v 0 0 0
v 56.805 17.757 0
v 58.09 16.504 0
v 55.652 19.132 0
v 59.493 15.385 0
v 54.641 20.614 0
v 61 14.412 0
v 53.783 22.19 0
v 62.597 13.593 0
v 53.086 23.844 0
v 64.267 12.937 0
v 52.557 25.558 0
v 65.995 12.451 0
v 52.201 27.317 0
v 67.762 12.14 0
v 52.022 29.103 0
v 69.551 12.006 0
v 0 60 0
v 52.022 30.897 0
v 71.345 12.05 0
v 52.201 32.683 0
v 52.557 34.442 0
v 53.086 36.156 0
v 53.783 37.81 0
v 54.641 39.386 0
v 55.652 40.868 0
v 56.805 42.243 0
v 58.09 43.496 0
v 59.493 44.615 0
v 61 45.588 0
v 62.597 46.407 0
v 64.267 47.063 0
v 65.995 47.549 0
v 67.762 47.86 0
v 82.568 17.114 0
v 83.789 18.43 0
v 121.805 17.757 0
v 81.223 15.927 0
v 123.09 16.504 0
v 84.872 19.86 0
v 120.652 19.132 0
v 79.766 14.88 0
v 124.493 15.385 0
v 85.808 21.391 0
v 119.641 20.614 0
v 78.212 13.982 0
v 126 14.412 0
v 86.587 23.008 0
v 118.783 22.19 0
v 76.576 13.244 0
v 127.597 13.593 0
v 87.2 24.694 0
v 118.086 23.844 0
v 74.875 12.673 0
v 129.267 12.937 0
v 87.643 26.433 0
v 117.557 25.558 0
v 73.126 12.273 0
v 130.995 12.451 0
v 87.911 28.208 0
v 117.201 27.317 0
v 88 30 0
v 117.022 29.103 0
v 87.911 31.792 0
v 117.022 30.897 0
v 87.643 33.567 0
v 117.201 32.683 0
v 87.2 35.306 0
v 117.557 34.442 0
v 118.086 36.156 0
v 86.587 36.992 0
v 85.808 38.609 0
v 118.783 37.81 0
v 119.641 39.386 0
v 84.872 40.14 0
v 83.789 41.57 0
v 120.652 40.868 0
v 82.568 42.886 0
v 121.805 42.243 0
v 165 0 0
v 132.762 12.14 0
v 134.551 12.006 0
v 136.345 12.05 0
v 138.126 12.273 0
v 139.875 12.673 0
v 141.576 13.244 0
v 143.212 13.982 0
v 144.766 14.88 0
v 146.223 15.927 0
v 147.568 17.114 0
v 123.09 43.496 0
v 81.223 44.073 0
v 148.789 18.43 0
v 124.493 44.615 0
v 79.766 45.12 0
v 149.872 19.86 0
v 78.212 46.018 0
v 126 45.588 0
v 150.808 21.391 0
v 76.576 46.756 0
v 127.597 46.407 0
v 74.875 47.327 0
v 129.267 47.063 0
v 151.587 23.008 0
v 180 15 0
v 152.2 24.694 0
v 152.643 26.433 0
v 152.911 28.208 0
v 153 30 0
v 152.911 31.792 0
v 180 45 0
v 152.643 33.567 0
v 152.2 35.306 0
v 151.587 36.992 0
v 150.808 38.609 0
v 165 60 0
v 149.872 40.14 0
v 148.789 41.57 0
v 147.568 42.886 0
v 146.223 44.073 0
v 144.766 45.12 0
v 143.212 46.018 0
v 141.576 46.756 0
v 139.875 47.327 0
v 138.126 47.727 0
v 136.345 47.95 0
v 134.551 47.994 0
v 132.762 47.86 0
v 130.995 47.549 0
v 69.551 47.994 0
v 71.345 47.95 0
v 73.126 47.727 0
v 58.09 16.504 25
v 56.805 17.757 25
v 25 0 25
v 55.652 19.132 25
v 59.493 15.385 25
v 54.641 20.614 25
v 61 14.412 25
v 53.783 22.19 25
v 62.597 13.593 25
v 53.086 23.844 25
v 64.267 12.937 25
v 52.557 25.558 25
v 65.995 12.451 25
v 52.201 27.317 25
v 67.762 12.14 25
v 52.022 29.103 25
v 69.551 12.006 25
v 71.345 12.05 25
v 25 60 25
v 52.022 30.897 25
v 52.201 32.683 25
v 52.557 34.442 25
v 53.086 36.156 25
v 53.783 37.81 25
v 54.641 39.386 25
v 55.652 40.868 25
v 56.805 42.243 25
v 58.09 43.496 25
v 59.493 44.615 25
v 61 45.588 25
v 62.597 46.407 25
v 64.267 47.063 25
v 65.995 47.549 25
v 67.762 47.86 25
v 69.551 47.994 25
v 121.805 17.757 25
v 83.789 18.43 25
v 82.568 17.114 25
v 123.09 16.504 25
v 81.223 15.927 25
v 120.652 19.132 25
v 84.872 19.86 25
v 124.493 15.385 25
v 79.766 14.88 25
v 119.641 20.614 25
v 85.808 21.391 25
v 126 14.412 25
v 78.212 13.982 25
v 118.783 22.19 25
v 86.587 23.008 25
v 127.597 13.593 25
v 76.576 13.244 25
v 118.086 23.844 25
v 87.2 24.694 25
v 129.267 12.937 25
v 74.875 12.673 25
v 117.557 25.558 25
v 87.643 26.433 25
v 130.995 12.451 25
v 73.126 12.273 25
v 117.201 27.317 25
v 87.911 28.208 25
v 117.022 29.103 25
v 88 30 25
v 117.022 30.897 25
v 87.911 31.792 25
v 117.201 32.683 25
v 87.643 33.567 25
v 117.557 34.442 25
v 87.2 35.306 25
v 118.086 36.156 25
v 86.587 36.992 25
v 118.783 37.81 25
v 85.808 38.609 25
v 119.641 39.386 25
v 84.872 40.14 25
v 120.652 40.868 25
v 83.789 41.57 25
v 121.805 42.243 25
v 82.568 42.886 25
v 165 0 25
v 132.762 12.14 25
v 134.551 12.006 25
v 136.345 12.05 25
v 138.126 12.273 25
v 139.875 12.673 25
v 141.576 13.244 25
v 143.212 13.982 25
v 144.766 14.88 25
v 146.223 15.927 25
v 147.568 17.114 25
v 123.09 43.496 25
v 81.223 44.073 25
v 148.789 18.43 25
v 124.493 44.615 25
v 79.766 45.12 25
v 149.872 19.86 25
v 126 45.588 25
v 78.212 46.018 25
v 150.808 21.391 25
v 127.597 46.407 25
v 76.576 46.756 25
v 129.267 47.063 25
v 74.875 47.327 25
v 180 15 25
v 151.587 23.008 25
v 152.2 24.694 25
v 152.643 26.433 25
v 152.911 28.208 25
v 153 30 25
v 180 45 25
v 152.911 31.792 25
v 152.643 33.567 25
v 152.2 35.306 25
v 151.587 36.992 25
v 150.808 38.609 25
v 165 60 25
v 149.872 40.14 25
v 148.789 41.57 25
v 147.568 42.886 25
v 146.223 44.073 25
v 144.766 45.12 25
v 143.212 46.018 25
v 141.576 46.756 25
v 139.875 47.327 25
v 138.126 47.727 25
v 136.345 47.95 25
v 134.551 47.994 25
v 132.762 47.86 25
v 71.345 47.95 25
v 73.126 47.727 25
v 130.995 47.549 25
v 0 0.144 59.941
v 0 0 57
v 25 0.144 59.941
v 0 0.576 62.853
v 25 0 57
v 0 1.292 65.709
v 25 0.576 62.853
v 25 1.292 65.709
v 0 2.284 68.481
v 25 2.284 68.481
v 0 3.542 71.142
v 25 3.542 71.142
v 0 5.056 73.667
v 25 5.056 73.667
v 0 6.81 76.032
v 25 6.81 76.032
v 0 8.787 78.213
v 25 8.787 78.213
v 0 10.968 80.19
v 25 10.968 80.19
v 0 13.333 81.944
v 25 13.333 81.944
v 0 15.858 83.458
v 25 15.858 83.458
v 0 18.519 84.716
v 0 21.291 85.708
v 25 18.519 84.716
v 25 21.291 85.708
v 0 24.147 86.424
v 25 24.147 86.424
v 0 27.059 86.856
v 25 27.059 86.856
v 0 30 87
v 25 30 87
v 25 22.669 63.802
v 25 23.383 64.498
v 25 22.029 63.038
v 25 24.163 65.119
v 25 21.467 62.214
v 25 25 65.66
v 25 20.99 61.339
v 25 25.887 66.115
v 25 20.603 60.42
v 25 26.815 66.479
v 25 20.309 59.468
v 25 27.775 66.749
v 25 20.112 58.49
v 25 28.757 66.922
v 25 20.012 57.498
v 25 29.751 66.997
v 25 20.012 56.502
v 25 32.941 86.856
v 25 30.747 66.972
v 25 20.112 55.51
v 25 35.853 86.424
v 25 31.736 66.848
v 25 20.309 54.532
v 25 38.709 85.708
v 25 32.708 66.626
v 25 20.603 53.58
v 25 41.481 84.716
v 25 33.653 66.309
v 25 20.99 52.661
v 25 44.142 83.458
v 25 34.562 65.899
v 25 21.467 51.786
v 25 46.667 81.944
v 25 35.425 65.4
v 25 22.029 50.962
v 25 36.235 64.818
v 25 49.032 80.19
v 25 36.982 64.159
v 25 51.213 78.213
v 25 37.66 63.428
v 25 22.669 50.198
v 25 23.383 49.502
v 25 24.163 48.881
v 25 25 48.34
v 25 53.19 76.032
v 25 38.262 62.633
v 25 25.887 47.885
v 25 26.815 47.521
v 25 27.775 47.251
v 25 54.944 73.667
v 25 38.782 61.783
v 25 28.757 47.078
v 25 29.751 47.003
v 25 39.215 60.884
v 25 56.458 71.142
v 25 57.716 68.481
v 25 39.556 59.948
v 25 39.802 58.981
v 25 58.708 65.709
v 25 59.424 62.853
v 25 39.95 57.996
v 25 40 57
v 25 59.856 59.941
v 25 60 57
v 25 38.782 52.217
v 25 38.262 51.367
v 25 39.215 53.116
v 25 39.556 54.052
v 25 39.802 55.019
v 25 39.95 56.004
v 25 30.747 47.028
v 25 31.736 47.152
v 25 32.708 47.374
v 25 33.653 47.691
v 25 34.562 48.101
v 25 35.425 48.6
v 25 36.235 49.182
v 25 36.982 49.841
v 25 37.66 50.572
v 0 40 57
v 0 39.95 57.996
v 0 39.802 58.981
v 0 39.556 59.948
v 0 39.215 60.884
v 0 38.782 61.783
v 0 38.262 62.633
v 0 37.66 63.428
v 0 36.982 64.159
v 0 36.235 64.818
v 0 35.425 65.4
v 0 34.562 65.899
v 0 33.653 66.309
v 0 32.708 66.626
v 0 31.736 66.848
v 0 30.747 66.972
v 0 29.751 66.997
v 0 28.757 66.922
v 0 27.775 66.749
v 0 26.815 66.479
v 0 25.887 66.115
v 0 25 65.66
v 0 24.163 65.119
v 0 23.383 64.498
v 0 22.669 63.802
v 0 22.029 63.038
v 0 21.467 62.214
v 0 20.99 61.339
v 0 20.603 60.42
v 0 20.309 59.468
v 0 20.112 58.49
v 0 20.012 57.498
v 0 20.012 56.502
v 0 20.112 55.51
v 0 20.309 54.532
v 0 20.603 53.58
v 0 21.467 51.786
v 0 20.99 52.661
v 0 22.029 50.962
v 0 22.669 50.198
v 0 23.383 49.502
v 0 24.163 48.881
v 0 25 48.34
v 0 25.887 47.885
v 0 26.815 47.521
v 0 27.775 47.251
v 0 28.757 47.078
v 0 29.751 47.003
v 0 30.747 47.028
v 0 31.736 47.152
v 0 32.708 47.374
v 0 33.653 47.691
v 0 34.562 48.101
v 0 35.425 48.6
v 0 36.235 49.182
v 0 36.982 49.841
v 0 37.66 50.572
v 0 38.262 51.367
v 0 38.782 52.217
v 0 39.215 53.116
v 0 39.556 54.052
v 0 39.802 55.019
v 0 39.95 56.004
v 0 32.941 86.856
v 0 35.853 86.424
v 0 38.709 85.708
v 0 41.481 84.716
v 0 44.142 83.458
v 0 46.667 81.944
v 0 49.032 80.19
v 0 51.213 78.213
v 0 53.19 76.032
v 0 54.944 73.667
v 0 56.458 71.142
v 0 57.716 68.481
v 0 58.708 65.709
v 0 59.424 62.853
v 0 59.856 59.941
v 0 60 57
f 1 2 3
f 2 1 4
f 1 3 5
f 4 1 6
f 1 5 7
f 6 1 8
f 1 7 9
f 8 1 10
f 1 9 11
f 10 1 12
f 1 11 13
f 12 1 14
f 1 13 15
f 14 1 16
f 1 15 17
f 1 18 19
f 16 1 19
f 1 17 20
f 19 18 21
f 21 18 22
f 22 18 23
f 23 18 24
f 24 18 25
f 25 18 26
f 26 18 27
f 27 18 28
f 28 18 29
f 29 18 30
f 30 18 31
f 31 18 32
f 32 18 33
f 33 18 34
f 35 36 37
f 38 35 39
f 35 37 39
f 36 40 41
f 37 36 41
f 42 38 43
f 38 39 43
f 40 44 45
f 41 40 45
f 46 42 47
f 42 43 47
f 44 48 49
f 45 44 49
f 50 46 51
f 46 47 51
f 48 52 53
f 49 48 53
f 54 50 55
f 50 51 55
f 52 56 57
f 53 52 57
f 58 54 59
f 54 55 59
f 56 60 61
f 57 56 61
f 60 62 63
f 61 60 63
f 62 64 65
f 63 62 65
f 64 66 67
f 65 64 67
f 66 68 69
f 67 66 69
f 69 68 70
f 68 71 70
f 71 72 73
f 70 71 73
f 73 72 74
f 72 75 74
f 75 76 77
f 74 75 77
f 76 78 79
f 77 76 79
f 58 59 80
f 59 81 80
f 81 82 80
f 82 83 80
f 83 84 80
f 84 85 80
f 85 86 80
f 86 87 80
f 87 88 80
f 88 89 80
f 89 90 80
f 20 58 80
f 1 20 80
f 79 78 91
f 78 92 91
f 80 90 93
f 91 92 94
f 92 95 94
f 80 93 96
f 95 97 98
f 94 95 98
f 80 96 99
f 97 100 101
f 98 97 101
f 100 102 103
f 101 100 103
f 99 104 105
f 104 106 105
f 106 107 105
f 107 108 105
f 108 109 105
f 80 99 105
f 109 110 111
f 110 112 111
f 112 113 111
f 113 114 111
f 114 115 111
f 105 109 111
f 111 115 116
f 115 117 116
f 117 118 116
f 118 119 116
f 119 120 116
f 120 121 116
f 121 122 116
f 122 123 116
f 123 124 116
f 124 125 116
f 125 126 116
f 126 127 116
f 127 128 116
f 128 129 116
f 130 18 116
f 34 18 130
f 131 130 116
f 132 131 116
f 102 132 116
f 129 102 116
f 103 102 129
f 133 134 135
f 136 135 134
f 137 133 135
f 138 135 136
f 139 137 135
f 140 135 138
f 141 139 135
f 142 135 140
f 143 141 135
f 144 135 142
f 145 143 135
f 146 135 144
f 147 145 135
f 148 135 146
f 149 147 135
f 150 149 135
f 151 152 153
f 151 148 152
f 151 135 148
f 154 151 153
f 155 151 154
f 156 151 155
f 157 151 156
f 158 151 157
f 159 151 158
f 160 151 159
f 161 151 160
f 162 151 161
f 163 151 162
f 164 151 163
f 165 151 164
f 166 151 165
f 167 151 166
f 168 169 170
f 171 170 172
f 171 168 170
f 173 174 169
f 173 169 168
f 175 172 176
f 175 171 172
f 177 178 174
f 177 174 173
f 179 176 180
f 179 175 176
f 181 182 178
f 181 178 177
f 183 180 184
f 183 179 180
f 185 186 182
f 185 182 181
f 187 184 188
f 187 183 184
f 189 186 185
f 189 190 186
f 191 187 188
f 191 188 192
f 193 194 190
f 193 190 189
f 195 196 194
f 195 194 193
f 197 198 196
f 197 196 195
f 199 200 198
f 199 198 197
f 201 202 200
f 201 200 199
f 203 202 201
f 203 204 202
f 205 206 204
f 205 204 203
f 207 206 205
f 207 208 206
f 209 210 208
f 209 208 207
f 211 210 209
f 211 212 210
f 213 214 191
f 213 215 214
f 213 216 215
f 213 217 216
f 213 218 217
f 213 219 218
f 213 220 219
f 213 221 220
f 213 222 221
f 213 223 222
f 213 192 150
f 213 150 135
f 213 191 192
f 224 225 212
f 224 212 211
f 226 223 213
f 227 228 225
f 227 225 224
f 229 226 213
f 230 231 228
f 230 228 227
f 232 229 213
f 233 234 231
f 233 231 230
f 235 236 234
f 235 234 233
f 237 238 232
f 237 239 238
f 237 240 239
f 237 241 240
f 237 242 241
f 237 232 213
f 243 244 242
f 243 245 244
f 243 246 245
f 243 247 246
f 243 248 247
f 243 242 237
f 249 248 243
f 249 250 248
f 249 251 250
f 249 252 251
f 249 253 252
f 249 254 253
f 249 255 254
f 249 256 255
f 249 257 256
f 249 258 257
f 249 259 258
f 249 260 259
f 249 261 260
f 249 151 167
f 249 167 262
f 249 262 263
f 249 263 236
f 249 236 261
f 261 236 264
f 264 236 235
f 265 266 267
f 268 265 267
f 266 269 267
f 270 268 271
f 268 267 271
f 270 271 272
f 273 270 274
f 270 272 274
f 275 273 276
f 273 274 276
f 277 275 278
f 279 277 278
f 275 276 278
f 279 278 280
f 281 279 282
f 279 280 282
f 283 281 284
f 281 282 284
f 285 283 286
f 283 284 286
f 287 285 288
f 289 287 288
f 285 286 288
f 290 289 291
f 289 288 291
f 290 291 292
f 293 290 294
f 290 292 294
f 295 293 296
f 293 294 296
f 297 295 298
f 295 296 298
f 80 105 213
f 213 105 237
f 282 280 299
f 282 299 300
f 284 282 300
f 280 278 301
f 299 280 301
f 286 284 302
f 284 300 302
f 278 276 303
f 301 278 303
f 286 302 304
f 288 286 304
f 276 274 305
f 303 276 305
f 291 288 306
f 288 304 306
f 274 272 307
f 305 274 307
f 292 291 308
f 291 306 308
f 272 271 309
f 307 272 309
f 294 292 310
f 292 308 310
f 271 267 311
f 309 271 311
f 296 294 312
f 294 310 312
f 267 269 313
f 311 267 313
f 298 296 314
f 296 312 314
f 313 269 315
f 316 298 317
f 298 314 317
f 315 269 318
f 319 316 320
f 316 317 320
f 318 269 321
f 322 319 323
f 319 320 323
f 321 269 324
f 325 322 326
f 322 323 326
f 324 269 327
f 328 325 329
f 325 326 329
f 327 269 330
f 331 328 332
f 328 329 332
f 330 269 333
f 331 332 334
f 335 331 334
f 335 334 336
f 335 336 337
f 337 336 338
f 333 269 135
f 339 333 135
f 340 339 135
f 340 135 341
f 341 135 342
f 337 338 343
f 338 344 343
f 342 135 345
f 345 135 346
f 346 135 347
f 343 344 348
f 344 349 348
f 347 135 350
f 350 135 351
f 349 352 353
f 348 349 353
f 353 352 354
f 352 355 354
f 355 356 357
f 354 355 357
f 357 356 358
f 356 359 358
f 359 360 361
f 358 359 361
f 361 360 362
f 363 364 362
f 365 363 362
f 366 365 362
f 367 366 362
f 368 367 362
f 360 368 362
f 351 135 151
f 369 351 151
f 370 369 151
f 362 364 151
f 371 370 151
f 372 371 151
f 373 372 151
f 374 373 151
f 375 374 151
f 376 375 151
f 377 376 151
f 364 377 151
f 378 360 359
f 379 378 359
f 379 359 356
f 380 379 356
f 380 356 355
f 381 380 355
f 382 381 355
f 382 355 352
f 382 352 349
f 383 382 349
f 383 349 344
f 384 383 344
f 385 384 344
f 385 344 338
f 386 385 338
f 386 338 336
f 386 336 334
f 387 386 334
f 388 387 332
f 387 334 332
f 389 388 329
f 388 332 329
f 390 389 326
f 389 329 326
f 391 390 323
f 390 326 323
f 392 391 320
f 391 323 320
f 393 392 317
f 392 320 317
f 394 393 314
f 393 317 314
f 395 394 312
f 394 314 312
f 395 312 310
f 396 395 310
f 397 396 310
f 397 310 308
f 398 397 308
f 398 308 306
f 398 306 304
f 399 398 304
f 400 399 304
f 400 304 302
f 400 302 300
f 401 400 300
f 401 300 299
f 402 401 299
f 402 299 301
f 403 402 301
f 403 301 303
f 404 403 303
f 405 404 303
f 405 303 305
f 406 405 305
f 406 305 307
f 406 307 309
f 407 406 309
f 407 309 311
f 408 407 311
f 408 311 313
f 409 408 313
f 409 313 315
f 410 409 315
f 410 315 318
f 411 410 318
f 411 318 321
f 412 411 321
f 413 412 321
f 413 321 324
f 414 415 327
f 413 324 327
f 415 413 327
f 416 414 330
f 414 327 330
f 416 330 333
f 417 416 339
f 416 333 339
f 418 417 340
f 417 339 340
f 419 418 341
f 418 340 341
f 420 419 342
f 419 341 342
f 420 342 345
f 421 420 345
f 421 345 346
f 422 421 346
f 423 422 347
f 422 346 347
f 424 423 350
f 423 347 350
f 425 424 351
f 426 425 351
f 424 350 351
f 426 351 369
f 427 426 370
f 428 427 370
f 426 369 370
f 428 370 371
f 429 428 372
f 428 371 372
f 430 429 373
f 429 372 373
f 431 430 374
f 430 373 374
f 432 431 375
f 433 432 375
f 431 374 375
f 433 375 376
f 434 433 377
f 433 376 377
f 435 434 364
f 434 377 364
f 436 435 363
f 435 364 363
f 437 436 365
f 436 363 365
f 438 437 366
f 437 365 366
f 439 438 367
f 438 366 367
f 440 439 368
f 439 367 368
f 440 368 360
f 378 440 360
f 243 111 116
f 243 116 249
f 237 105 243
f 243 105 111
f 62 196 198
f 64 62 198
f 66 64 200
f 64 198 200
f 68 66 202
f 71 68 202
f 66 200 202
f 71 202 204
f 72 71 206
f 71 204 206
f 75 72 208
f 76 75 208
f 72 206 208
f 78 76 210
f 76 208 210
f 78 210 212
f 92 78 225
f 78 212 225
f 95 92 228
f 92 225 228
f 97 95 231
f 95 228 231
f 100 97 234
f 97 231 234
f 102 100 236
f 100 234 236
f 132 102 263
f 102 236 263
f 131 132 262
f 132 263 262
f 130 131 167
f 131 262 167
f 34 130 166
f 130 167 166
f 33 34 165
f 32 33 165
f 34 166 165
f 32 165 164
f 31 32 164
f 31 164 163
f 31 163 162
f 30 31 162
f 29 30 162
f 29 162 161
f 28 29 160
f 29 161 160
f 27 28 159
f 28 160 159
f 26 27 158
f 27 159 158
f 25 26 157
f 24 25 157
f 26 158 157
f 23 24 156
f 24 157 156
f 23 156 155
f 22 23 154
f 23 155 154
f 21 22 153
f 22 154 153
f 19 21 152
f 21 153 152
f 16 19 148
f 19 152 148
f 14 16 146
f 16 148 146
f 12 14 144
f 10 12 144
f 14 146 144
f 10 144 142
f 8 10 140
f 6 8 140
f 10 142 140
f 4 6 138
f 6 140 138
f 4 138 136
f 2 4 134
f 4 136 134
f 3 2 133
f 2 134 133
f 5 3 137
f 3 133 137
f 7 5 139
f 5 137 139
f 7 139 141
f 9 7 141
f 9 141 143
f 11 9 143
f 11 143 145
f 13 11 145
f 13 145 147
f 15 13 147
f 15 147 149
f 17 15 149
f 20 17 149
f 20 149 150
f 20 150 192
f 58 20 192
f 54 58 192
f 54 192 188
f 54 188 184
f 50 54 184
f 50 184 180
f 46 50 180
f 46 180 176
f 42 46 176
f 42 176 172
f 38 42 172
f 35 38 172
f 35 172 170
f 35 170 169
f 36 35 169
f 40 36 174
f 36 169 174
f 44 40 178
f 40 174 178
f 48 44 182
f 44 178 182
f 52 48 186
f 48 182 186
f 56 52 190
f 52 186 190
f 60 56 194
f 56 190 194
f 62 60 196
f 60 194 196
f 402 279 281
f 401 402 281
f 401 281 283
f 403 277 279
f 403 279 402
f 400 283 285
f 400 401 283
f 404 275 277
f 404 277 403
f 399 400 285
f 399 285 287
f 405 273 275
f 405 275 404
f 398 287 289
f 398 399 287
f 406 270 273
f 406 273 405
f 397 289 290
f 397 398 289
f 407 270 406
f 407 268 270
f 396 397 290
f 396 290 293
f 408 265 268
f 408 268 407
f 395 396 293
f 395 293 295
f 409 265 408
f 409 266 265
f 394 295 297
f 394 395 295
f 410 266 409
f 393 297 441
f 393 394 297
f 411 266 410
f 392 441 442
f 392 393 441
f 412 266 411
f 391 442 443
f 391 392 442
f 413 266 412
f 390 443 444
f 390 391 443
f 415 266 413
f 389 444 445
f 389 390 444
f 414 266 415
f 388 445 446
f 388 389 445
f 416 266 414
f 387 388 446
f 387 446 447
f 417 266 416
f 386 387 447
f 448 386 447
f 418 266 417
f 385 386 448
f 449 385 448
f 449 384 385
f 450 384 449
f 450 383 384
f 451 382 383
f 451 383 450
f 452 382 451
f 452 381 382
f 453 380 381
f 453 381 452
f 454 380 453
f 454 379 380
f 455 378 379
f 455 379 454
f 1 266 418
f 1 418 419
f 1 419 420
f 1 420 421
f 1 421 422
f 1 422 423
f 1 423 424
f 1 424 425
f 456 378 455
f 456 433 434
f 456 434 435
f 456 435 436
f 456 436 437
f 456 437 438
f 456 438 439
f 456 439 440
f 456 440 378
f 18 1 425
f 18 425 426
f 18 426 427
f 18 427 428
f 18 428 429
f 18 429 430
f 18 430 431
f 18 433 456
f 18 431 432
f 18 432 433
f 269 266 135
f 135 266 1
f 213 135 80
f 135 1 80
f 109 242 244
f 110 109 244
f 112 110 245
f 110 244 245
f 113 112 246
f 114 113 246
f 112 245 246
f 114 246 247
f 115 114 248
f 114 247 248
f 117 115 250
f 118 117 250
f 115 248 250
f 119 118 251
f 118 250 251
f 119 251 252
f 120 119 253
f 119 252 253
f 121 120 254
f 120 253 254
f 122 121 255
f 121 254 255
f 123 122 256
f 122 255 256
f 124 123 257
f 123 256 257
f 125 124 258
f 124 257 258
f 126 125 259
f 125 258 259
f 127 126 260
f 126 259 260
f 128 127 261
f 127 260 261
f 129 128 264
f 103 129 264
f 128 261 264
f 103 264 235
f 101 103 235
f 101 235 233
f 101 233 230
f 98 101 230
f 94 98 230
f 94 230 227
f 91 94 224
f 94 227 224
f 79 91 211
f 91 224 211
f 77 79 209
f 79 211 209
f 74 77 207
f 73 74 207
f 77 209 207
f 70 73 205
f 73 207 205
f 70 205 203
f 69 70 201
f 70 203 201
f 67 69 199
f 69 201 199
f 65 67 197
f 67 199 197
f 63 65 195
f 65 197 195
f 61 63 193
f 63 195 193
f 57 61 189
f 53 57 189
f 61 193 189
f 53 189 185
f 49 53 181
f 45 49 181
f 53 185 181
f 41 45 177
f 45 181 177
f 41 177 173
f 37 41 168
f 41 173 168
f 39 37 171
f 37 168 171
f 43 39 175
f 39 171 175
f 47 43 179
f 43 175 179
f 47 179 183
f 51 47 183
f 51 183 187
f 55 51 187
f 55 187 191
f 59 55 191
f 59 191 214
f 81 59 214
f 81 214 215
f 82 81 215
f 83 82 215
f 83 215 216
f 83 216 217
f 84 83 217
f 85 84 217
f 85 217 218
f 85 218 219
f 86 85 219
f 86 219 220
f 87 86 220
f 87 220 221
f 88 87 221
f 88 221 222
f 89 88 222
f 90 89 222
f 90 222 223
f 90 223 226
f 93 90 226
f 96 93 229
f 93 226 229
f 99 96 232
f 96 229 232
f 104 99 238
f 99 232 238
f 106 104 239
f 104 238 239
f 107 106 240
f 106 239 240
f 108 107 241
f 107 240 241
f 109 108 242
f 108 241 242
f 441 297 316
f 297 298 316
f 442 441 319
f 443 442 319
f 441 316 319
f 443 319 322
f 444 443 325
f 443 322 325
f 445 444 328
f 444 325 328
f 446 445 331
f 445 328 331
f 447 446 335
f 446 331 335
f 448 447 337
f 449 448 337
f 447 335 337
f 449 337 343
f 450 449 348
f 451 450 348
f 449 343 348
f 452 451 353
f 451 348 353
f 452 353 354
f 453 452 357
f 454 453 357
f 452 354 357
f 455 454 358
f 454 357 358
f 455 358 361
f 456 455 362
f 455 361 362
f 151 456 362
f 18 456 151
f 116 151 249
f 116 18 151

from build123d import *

# Parameters (mm, degrees)
F0_W      = 180
F0_H      = 60
F1_DEPTH  = 25
F2_W      = 25
F2_H      = 60
F3_DEPTH  = 62
F4_R      = 30
F5_R      = 29.99999
F6_R      = 18
F7_DEPTH  = 25
F8_SIZE   = 15
F9_R      = 10
F10_DEPTH = 25.001


# Not quite as in the source:
# - a fillet or chamfer is up to 0.001 mm smaller than in the source, because OpenCascade refuses the exact size


with BuildPart() as f1:
    # F0 (on Top) → F1 (new body)
    with BuildSketch(Plane.XY):
        with Locations((90, 30)):
            Rectangle(F0_W, F0_H)
    extrude(amount=F1_DEPTH)

    # F2 (on face) → F3 (join)
    with BuildSketch(Plane.XY.offset(25)):
        with Locations((12.5, 30)):
            Rectangle(F2_W, F2_H)
    extrude(amount=F3_DEPTH)

    # F4
    f4_edges = [f1.edges().sort_by_distance(p)[0] for p in [
        (12.5, 0, 87),
    ]]
    fillet(f4_edges, radius=F4_R)

    # F5 (radius 30 in the source; OpenCascade refuses exactly that, so slightly less here)
    f5_edges = [f1.edges().sort_by_distance(p)[0] for p in [
        (12.5, 60, 87),
    ]]
    fillet(f5_edges, radius=F5_R)

    # F6 (on face) → F7 (cut)
    with BuildSketch(Plane.XY.offset(25)):
        with Locations((70, 30)):
            Circle(F6_R)
        with Locations((135, 30)):
            Circle(F6_R)
    extrude(amount=-F7_DEPTH, mode=Mode.SUBTRACT)

    # F8
    f8_edges = [f1.edges().sort_by_distance(p)[0] for p in [
        (180, 0, 12.5),
        (180, 60, 12.5),
    ]]
    chamfer(f8_edges, length=F8_SIZE)

    # F9 (on face) → F10 (cut, through all)
    with BuildSketch(Plane.YZ.offset(25)):
        with Locations((30, 57)):
            Circle(F9_R)
    extrude(amount=-F10_DEPTH, mode=Mode.SUBTRACT)


solid = f1.part
